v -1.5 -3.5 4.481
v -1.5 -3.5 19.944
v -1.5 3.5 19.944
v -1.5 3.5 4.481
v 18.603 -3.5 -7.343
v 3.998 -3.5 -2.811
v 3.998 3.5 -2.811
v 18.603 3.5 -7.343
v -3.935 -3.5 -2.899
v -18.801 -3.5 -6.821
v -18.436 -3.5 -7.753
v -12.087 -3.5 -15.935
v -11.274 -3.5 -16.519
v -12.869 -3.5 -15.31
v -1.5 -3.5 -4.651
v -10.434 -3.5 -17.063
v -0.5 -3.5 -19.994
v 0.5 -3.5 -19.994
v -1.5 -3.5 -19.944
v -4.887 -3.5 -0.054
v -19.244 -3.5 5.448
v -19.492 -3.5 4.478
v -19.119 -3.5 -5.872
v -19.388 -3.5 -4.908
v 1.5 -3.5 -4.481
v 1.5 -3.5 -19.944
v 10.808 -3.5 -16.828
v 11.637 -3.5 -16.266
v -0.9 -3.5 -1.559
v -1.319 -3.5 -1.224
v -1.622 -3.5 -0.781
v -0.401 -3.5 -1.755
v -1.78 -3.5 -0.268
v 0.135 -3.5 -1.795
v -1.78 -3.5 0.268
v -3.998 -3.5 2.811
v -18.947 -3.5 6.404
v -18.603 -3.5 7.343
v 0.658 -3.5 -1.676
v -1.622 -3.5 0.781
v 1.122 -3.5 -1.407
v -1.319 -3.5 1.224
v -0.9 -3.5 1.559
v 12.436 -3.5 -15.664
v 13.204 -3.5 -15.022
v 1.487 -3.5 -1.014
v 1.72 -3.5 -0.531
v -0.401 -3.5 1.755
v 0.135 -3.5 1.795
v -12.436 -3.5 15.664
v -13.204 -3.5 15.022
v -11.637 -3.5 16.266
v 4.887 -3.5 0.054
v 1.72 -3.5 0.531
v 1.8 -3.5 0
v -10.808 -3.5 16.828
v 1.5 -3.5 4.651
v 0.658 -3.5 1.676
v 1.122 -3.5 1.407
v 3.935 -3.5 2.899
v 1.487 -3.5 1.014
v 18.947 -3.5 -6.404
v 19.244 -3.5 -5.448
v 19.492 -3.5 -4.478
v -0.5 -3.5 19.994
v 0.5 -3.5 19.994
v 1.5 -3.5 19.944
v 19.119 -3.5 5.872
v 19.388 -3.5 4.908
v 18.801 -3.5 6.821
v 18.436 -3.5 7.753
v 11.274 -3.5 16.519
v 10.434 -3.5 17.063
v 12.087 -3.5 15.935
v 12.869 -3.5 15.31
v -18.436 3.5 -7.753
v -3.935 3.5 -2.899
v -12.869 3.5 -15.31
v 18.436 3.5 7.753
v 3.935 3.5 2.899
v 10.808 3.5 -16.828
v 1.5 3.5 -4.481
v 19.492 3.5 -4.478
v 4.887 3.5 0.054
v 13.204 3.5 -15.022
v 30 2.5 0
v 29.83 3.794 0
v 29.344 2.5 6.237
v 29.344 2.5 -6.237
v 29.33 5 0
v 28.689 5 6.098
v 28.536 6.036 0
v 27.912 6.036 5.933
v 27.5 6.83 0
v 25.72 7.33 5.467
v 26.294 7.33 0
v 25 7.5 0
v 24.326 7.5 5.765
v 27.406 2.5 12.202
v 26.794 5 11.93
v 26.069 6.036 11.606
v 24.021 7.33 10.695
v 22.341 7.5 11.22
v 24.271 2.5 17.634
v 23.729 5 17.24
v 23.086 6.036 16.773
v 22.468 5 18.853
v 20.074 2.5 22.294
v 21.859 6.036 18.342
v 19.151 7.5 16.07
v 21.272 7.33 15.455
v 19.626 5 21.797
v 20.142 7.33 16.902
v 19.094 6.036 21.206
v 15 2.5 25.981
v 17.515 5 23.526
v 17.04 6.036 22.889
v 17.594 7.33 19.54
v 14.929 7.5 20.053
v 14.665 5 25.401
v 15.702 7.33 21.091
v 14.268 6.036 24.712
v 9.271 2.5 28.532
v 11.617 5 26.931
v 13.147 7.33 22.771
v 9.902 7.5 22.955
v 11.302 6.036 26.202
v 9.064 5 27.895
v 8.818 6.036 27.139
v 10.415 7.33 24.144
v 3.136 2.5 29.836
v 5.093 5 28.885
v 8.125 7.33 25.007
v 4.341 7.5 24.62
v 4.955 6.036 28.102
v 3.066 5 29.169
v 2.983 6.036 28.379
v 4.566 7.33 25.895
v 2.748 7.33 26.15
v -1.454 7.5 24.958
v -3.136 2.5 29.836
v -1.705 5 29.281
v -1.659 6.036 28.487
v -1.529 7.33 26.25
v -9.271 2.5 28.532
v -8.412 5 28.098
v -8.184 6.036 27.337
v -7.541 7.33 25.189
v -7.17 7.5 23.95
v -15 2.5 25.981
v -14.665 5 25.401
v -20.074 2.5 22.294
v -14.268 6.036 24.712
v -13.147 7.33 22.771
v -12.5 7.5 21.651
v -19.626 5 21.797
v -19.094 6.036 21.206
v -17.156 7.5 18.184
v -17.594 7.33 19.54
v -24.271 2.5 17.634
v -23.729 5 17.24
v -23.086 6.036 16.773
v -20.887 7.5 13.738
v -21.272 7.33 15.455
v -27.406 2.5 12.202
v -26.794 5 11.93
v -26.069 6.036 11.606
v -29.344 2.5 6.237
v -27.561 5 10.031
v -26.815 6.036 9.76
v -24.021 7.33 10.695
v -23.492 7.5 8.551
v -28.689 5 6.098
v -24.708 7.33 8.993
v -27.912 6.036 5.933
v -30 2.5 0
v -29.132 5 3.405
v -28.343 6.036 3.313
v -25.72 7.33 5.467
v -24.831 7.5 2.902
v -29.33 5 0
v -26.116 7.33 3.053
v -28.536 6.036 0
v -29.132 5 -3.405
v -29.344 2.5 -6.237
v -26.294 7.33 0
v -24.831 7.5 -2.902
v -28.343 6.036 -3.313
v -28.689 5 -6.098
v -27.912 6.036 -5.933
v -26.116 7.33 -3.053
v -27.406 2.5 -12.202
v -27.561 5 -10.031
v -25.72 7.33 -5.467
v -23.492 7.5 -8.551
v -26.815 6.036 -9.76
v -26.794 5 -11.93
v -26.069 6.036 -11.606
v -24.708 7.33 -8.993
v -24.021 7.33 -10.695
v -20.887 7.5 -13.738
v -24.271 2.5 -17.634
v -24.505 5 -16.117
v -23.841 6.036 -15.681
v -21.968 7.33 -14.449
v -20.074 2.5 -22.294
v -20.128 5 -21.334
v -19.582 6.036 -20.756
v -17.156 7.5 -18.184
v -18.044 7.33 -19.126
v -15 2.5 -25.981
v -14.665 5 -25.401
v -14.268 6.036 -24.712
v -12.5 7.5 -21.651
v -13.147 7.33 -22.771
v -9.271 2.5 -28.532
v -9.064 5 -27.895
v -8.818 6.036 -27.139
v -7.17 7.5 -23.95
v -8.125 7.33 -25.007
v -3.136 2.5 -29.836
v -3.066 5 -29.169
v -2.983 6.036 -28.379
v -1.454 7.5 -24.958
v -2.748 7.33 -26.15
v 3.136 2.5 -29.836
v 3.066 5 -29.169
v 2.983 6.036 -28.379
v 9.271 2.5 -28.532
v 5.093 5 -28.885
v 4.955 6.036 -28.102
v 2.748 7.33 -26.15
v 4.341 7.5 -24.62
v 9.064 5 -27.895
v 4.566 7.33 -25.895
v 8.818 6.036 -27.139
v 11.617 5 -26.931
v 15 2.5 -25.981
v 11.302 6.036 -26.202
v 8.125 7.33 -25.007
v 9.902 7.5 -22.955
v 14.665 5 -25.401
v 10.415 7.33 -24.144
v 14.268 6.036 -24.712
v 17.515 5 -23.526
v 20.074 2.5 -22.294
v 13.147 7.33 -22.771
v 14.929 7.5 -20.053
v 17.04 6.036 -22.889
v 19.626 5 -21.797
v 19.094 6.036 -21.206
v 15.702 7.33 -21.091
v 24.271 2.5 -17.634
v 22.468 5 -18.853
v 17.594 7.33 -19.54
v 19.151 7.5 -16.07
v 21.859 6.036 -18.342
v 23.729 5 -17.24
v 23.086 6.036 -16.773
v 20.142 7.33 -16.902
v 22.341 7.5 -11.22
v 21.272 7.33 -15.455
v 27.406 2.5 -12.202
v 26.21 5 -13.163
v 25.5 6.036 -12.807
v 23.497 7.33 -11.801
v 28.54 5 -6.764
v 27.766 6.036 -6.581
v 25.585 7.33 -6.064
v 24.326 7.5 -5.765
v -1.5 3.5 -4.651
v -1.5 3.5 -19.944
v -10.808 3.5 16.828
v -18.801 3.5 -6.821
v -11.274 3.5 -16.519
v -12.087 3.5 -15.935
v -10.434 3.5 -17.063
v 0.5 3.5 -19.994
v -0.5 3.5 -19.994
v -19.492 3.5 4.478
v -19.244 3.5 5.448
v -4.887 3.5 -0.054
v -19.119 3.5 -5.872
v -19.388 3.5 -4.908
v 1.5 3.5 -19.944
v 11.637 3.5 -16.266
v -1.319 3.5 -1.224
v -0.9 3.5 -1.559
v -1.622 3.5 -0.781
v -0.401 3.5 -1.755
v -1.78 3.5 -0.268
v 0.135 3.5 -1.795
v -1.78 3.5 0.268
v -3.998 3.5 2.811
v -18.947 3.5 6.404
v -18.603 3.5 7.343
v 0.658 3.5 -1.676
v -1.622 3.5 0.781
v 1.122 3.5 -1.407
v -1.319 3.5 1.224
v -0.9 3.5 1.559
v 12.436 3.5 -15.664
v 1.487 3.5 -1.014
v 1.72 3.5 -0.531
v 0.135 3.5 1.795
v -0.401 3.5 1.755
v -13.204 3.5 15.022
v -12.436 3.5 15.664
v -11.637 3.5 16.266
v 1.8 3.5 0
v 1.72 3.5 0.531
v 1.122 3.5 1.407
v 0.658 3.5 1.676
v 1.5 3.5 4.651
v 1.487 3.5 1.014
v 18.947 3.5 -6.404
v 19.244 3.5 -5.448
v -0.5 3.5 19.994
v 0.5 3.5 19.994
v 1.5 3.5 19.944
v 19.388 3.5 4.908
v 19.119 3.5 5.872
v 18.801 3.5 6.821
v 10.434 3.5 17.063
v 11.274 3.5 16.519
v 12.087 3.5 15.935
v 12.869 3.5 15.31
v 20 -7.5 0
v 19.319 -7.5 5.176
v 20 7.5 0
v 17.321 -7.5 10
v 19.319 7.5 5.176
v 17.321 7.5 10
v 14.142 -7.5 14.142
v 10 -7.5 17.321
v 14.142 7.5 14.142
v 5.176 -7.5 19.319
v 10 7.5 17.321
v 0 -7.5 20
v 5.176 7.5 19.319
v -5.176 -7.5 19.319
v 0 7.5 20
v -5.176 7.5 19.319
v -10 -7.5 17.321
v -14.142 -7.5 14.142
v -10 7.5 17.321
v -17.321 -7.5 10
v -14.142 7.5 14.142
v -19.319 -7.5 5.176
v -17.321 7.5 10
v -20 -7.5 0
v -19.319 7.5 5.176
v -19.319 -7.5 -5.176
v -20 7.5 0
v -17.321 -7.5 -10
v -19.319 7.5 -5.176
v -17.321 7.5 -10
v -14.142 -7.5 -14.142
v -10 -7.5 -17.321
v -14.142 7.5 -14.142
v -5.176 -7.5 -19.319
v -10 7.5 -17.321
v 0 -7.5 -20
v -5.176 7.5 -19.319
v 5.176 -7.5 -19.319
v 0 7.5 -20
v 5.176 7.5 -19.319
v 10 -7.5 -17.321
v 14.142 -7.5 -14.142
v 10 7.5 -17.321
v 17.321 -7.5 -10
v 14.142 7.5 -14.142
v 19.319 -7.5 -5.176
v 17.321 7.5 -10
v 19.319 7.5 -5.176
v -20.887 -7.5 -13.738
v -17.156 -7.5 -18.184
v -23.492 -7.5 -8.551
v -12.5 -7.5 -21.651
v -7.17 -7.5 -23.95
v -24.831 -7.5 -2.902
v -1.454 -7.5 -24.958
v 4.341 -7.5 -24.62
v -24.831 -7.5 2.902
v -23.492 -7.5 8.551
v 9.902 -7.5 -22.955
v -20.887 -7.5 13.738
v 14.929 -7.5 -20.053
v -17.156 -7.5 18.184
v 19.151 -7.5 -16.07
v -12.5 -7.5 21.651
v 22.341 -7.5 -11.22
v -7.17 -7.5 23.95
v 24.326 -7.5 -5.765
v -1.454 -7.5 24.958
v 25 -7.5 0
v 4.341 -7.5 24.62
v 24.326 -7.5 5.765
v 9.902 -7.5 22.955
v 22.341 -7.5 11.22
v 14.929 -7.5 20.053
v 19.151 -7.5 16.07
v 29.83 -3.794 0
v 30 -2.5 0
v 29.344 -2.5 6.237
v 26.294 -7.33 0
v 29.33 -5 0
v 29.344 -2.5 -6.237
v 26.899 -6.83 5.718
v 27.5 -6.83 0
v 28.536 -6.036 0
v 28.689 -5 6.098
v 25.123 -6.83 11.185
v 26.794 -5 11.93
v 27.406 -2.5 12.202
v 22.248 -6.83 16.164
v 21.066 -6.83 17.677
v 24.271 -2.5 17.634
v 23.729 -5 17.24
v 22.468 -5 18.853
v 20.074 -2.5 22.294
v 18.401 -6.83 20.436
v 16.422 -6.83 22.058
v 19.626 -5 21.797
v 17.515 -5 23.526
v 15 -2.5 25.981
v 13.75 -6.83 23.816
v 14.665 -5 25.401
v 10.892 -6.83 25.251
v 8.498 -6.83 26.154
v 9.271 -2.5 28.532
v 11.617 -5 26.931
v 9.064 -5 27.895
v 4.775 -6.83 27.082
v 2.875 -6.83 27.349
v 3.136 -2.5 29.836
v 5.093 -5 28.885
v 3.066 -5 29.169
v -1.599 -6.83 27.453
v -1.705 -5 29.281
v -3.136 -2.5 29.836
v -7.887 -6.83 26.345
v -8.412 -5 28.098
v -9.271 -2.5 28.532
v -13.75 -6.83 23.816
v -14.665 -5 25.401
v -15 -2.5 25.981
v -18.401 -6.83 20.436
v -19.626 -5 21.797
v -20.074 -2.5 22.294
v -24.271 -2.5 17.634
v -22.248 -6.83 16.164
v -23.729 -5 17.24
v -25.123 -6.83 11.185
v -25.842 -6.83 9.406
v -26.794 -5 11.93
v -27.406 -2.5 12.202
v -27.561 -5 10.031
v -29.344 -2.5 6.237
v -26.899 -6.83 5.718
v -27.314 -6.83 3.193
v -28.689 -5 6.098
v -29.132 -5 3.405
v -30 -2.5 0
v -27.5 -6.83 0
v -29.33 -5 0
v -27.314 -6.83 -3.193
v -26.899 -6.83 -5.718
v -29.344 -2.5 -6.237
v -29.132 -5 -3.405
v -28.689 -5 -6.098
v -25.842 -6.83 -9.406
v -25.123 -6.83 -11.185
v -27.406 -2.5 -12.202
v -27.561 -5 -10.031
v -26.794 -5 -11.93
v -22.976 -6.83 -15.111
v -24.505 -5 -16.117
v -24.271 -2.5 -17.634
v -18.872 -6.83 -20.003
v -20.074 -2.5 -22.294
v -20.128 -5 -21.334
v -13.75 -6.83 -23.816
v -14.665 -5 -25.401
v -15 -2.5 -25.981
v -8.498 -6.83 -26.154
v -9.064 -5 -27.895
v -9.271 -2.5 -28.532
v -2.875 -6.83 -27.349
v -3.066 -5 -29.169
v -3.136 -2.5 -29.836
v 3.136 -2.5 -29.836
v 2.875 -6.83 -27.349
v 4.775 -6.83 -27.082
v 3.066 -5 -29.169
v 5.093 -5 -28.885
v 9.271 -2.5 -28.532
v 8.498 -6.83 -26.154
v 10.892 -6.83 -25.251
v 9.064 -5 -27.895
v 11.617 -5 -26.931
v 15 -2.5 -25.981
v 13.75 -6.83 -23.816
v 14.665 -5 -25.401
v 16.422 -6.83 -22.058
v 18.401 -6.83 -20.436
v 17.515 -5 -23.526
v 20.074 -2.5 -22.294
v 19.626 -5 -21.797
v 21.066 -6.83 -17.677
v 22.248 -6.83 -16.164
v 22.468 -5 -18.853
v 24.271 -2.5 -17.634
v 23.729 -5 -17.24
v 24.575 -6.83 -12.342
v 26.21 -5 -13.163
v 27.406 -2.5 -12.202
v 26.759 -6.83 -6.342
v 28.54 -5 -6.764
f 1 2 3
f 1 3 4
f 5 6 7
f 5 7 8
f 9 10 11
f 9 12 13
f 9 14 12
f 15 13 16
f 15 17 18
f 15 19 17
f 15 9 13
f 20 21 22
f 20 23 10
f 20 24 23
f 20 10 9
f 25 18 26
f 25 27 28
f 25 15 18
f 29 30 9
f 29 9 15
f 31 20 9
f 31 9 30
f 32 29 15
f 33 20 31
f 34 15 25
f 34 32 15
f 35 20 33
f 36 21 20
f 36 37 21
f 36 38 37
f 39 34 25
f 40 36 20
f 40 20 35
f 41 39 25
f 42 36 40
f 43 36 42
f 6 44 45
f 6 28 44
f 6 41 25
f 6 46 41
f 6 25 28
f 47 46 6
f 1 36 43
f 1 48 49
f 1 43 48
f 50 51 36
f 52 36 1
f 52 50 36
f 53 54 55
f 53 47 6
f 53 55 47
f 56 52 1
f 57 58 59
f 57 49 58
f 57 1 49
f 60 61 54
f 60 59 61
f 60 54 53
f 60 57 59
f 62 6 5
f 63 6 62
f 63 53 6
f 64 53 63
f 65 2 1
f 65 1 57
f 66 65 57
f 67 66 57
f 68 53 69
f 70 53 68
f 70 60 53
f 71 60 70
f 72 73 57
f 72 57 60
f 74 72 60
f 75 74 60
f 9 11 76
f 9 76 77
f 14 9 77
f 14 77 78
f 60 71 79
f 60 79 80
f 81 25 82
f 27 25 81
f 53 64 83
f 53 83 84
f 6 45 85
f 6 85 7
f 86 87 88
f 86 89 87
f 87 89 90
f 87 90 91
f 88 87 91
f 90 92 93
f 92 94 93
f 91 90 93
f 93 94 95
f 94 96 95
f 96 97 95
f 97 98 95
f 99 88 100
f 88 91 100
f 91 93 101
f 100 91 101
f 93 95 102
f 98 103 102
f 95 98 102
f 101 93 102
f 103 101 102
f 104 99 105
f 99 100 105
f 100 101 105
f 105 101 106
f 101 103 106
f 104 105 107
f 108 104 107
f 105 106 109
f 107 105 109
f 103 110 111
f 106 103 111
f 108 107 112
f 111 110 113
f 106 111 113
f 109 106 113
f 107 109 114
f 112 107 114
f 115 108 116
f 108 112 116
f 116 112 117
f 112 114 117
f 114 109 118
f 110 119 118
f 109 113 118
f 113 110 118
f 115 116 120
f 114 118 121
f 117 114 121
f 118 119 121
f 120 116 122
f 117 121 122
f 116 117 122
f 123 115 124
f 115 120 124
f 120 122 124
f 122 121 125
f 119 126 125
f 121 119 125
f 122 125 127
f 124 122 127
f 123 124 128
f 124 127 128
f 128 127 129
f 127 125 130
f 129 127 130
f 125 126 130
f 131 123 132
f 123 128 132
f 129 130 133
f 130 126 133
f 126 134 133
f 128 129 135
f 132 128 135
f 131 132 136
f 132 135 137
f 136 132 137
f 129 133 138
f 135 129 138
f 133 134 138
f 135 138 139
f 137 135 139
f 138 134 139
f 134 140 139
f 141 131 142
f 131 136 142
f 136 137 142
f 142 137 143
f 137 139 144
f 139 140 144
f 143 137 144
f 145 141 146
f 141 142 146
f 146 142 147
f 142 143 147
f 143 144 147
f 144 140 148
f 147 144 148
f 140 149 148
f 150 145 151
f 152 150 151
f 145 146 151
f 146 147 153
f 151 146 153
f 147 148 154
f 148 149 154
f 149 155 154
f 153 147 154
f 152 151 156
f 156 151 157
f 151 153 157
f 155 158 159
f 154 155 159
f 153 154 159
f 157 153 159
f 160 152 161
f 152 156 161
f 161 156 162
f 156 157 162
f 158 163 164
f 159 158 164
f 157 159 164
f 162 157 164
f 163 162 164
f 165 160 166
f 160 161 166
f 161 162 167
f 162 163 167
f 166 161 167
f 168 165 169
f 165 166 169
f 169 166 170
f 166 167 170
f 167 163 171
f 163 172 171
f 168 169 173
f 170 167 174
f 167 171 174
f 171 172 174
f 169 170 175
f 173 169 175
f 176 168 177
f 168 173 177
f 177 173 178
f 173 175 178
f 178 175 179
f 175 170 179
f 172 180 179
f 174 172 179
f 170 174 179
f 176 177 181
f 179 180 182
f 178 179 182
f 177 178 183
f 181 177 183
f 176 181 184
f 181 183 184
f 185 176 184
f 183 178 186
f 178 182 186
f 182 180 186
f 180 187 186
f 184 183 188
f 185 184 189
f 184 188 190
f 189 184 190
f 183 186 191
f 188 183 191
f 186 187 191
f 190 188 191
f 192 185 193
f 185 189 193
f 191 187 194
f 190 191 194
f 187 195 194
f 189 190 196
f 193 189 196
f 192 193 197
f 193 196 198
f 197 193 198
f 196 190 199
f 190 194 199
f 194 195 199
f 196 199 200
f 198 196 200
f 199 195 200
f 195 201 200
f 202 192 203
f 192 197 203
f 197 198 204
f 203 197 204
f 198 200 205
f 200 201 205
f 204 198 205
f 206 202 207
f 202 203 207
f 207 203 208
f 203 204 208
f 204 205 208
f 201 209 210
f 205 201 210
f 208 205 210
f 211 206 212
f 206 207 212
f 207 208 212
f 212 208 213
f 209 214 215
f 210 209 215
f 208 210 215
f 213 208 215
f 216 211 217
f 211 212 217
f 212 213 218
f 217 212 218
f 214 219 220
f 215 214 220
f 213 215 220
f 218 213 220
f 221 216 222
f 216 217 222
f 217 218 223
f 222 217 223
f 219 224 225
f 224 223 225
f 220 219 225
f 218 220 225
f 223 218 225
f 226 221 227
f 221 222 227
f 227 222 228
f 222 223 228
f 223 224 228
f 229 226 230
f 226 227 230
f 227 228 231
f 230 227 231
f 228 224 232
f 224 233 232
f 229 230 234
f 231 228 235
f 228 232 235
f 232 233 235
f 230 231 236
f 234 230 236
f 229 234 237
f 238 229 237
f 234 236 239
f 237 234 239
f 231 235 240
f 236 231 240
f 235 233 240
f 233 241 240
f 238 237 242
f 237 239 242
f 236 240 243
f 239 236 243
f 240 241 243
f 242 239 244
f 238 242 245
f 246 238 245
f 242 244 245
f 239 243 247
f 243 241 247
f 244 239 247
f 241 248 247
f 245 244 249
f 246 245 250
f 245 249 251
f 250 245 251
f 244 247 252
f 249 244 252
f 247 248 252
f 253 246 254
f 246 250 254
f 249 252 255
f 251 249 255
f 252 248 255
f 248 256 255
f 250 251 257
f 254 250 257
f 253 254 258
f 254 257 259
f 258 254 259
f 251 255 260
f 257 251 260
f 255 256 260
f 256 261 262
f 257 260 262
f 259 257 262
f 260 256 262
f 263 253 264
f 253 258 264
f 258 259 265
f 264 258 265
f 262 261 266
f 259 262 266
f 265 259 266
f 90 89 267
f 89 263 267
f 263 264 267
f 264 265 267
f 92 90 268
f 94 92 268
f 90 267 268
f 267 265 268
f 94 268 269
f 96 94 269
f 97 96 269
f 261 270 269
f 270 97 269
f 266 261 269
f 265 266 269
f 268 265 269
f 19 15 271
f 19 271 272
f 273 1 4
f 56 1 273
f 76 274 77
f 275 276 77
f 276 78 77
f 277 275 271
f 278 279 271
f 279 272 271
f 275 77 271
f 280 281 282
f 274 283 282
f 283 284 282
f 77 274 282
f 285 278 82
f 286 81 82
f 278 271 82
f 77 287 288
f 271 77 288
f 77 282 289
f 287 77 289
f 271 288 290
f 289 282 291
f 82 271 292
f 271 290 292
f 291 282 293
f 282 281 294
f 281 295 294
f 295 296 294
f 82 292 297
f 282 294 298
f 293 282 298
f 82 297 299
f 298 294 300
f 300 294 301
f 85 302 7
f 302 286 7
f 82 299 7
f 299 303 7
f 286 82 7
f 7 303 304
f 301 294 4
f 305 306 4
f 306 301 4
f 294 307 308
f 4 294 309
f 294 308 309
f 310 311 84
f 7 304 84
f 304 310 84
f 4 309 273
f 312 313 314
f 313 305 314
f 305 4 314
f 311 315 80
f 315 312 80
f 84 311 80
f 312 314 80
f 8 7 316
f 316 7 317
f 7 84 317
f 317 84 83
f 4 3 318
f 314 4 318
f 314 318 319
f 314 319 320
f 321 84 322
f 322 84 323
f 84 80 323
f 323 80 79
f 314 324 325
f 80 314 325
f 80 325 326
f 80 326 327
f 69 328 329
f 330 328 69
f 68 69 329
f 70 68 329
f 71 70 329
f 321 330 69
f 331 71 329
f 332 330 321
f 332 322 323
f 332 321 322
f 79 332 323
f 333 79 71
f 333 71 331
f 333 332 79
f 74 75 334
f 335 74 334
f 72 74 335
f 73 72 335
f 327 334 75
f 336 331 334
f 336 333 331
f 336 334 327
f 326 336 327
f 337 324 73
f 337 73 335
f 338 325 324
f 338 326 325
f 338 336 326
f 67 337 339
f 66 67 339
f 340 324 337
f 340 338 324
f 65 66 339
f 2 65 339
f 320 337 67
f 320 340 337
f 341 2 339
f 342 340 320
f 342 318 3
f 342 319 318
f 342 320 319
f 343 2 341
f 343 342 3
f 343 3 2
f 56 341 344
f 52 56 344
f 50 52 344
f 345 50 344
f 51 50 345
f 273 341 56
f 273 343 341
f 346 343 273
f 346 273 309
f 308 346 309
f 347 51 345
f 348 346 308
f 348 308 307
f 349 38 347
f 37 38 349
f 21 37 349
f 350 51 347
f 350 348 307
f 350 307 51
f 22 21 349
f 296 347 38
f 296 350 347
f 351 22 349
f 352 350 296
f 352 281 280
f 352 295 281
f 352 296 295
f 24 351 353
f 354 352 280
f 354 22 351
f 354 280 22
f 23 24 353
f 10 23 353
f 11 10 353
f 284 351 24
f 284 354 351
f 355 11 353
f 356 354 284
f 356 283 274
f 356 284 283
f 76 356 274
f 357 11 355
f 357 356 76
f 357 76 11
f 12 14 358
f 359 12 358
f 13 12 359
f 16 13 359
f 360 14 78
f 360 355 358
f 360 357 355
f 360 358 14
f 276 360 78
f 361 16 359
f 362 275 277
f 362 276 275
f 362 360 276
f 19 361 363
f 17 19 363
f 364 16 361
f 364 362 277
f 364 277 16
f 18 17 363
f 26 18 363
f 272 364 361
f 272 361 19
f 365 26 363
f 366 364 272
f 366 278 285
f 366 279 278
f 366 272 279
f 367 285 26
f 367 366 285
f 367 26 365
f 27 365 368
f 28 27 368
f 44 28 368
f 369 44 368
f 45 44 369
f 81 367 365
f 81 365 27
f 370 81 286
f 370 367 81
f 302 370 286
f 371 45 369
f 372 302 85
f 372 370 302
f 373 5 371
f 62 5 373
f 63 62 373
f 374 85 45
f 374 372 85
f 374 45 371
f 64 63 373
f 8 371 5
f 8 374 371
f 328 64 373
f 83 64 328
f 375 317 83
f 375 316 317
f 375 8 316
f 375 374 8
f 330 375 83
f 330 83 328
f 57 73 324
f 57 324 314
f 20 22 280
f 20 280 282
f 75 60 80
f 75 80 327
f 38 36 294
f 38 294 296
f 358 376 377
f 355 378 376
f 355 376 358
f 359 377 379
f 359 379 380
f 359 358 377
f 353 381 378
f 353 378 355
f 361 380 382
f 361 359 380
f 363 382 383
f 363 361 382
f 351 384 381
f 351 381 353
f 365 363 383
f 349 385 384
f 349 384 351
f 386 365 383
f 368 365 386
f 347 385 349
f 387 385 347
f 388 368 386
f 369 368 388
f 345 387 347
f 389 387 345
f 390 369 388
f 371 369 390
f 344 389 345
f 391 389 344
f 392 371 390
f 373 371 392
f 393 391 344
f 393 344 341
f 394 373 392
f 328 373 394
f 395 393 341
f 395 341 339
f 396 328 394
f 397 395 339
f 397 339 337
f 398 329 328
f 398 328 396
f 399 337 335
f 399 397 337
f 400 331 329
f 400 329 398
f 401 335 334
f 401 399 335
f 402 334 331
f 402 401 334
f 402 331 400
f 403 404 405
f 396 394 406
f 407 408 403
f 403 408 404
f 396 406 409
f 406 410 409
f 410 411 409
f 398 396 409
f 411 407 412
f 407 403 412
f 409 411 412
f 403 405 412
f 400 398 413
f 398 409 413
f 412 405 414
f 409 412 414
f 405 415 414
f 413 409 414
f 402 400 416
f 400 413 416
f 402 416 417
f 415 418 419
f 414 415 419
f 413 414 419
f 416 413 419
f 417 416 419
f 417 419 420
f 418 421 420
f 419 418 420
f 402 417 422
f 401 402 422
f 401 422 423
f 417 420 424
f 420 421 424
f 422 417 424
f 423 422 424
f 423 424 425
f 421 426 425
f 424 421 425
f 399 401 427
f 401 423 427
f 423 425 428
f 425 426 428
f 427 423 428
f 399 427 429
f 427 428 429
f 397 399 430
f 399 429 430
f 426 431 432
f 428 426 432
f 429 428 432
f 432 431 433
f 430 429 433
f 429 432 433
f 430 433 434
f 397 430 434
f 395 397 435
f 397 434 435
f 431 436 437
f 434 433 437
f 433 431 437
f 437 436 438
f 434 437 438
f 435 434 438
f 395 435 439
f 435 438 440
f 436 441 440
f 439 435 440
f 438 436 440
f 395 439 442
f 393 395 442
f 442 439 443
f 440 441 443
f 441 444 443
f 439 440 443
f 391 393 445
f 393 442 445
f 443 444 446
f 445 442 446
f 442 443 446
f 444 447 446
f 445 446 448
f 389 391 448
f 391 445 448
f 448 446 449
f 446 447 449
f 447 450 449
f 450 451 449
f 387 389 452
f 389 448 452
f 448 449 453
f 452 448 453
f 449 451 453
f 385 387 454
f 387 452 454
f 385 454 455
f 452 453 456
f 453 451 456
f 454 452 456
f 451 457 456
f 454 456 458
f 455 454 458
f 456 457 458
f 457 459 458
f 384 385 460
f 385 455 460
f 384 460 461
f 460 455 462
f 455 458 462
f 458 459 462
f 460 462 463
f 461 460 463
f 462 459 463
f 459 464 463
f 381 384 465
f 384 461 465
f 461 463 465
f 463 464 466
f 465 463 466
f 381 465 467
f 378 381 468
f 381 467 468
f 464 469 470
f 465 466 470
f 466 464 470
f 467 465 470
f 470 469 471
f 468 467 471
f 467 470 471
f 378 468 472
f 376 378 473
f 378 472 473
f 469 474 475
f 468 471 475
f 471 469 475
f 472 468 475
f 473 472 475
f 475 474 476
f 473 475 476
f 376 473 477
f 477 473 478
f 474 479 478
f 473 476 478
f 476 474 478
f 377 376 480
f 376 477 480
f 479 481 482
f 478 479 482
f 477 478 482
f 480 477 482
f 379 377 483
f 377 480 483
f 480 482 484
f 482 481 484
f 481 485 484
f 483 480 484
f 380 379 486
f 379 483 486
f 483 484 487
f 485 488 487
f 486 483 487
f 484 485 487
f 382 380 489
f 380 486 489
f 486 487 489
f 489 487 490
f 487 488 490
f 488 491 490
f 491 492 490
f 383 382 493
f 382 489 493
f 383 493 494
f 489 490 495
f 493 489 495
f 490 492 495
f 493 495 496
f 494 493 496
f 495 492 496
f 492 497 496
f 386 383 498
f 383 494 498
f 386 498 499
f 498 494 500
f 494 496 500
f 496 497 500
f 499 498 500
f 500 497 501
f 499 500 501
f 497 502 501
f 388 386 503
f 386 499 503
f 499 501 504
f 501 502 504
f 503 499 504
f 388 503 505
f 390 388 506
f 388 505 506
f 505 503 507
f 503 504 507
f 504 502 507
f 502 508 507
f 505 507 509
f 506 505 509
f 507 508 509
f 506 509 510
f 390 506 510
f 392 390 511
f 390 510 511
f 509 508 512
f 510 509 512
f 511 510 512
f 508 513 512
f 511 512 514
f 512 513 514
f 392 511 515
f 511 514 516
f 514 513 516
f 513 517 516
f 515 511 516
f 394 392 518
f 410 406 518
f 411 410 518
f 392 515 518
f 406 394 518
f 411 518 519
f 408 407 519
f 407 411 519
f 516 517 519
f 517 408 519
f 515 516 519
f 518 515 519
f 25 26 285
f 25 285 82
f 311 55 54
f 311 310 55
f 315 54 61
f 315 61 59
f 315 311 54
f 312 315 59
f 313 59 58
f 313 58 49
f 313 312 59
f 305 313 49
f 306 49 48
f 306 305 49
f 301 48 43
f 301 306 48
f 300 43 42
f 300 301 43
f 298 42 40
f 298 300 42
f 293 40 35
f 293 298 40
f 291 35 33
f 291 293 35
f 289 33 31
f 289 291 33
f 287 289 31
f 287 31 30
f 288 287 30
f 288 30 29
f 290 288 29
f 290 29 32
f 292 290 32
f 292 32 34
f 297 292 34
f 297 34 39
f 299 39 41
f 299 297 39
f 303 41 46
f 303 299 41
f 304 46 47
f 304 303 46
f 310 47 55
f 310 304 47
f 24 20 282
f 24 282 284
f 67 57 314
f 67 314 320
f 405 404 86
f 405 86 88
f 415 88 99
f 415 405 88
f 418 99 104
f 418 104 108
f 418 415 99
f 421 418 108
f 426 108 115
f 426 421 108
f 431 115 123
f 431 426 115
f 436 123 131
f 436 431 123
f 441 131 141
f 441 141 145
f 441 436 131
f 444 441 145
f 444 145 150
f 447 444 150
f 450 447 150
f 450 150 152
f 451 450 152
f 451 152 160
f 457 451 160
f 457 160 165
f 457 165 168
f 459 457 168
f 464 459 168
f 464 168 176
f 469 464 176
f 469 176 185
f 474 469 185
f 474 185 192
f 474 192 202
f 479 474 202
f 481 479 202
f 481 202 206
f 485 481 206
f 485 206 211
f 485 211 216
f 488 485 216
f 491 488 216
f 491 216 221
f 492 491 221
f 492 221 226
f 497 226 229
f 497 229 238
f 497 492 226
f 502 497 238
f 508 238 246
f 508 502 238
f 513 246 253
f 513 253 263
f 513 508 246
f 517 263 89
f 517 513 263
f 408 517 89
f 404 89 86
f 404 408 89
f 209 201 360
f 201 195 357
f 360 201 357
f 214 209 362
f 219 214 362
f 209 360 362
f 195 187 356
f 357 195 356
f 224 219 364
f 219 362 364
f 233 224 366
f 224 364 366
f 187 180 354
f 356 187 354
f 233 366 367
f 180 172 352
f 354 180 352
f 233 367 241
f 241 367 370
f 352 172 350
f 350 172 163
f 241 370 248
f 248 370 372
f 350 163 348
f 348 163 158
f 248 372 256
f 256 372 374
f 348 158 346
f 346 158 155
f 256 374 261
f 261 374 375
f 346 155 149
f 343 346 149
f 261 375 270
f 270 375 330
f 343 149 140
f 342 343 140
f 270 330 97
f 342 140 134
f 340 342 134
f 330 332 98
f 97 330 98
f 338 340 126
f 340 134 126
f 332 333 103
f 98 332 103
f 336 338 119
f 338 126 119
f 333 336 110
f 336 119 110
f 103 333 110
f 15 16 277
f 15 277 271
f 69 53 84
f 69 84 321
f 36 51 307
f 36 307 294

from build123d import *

# Parameters (mm, degrees)
F2_DEPTH = 3.5
F0_R     = 30
F0_R_2   = 20
F3_DEPTH = 7.5
F4_R     = 4.000000066
F4_R_2   = 1.8
F5_DEPTH = 3.5
F6_R     = 5
F7_R     = 5


with BuildPart() as f2:
    # F1 (on Front) → F2 (new body, symmetric)
    with BuildSketch(Plane.XZ):
        Polygon((-1.5, -23.2615247369), (1.5, -23.2615247369), (1.5, -4.4813106249), (0.0279501338, -2.5287712352), (-1.5, -4.6514858813), align=None)
        Polygon((0.0279501338, -2.5287712352), (1.5, -4.4813106249), (1.5, -2.0360415442), (0.5866393147, -1.7526086625), align=None)
        Polygon((1.5, -2.0360415442), (1.5, -4.4813106249), (12.8056726102, -19.4772503728), (15.2011628307, -17.6712529742), (3.9979355773, -2.8111976138), align=None)
        Polygon((-12.3720384359, -19.755535883), (-1.5, -4.6514858813), (-1.5, -2.0838847412), (-3.9348229661, -2.8988772188), (-14.806861402, -18.0029272205), align=None)
        Polygon((-1.5, -2.0838847412), (-1.5, -4.6514858813), (0.0279501338, -2.5287712352), (-0.5477580826, -1.7651469889), align=None)
        Polygon((1.5, -1.0797142258), (1.5, -2.0360415442), (3.9979355773, -2.8111976138), (2.4522419174, -0.7609764734), align=None)
        Polygon((-3.9348229661, -2.8988772188), (-1.5, -2.0838847412), (-1.5, -1.1050855059), (-2.4348229661, -0.8149924776), align=None)
        Polygon((2.4522419174, -0.7609764734), (3.9979355773, -2.8111976138), (21.7718478308, -8.3267745926), (22.660977137, -5.4615609746), (4.8870648835, 0.0540160042), align=None)
        Polygon((-21.5824822139, -8.8059635798), (-3.9348229661, -2.8988772188), (-2.4348229661, -0.8149924776), (-4.8870648835, -0.0540160042), (-22.5347241314, -5.9611023652), align=None)
        Polygon((1.8630056265, 0.0205915252), (2.4522419174, -0.7609764734), (4.8870648835, 0.0540160042), (2.4348229661, 0.8149924776), align=None)
        Polygon((-4.8870648835, -0.0540160042), (-2.4348229661, -0.8149924776), (-1.8630056265, -0.0205915252), (-2.4522419174, 0.7609764734), align=None)
        Polygon((2.4348229661, 0.8149924776), (4.8870648835, 0.0540160042), (22.5347241314, 5.9611023652), (21.5824822139, 8.8059635798), (3.9348229661, 2.8988772188), align=None)
        Polygon((-22.660977137, 5.4615609746), (-4.8870648835, -0.0540160042), (-2.4522419174, 0.7609764734), (-3.9979355773, 2.8111976138), (-21.7718478308, 8.3267745926), align=None)
        Polygon((1.5, 2.0838847412), (1.5, 1.1050855059), (2.4348229661, 0.8149924776), (3.9348229661, 2.8988772188), align=None)
        Polygon((-2.4522419174, 0.7609764734), (-1.5, 1.0797142258), (-1.5, 2.0360415442), (-3.9979355773, 2.8111976138), align=None)
        Polygon((0.5477580826, 1.7651469889), (1.5, 2.0838847412), (1.5, 4.6514858813), (-0.0279501338, 2.5287712352), align=None)
        Polygon((1.5, 4.6514858813), (1.5, 2.0838847412), (3.9348229661, 2.8988772188), (14.806861402, 18.0029272205), (12.3720384359, 19.755535883), align=None)
        Polygon((-3.9979355773, 2.8111976138), (-1.5, 2.0360415442), (-1.5, 4.4813106249), (-12.8056726102, 19.4772503728), (-15.2011628307, 17.6712529742), align=None)
        Polygon((-1.5, 4.4813106249), (-1.5, 2.0360415442), (-0.5866393147, 1.7526086625), (-0.0279501338, 2.5287712352), align=None)
        Polygon((-0.0279501338, 2.5287712352), (1.5, 4.6514858813), (1.5, 23.2615247369), (-1.5, 23.2615247369), (-1.5, 4.4813106249), align=None)
    extrude(amount=F2_DEPTH, both=True)

    # F0 (on Front) → F3 (join, symmetric)
    with BuildSketch(Plane.XZ):
        Circle(F0_R)
        Circle(F0_R_2, mode=Mode.SUBTRACT)
    extrude(amount=F3_DEPTH, both=True)

    # F4 (on Front) → F5 (join, symmetric)
    with BuildSketch(Plane.XZ):
        Circle(F4_R)
        Circle(F4_R_2, mode=Mode.SUBTRACT)
    extrude(amount=F5_DEPTH, both=True)

    # F6
    f6_edges = [f2.edges().sort_by_distance(p)[0] for p in [
        (-30, -7.5, 0),
    ]]
    fillet(f6_edges, radius=F6_R)

    # F7
    f7_edges = [f2.edges().sort_by_distance(p)[0] for p in [
        (-30, 7.5, 0),
    ]]
    fillet(f7_edges, radius=F7_R)


solid = f2.part
